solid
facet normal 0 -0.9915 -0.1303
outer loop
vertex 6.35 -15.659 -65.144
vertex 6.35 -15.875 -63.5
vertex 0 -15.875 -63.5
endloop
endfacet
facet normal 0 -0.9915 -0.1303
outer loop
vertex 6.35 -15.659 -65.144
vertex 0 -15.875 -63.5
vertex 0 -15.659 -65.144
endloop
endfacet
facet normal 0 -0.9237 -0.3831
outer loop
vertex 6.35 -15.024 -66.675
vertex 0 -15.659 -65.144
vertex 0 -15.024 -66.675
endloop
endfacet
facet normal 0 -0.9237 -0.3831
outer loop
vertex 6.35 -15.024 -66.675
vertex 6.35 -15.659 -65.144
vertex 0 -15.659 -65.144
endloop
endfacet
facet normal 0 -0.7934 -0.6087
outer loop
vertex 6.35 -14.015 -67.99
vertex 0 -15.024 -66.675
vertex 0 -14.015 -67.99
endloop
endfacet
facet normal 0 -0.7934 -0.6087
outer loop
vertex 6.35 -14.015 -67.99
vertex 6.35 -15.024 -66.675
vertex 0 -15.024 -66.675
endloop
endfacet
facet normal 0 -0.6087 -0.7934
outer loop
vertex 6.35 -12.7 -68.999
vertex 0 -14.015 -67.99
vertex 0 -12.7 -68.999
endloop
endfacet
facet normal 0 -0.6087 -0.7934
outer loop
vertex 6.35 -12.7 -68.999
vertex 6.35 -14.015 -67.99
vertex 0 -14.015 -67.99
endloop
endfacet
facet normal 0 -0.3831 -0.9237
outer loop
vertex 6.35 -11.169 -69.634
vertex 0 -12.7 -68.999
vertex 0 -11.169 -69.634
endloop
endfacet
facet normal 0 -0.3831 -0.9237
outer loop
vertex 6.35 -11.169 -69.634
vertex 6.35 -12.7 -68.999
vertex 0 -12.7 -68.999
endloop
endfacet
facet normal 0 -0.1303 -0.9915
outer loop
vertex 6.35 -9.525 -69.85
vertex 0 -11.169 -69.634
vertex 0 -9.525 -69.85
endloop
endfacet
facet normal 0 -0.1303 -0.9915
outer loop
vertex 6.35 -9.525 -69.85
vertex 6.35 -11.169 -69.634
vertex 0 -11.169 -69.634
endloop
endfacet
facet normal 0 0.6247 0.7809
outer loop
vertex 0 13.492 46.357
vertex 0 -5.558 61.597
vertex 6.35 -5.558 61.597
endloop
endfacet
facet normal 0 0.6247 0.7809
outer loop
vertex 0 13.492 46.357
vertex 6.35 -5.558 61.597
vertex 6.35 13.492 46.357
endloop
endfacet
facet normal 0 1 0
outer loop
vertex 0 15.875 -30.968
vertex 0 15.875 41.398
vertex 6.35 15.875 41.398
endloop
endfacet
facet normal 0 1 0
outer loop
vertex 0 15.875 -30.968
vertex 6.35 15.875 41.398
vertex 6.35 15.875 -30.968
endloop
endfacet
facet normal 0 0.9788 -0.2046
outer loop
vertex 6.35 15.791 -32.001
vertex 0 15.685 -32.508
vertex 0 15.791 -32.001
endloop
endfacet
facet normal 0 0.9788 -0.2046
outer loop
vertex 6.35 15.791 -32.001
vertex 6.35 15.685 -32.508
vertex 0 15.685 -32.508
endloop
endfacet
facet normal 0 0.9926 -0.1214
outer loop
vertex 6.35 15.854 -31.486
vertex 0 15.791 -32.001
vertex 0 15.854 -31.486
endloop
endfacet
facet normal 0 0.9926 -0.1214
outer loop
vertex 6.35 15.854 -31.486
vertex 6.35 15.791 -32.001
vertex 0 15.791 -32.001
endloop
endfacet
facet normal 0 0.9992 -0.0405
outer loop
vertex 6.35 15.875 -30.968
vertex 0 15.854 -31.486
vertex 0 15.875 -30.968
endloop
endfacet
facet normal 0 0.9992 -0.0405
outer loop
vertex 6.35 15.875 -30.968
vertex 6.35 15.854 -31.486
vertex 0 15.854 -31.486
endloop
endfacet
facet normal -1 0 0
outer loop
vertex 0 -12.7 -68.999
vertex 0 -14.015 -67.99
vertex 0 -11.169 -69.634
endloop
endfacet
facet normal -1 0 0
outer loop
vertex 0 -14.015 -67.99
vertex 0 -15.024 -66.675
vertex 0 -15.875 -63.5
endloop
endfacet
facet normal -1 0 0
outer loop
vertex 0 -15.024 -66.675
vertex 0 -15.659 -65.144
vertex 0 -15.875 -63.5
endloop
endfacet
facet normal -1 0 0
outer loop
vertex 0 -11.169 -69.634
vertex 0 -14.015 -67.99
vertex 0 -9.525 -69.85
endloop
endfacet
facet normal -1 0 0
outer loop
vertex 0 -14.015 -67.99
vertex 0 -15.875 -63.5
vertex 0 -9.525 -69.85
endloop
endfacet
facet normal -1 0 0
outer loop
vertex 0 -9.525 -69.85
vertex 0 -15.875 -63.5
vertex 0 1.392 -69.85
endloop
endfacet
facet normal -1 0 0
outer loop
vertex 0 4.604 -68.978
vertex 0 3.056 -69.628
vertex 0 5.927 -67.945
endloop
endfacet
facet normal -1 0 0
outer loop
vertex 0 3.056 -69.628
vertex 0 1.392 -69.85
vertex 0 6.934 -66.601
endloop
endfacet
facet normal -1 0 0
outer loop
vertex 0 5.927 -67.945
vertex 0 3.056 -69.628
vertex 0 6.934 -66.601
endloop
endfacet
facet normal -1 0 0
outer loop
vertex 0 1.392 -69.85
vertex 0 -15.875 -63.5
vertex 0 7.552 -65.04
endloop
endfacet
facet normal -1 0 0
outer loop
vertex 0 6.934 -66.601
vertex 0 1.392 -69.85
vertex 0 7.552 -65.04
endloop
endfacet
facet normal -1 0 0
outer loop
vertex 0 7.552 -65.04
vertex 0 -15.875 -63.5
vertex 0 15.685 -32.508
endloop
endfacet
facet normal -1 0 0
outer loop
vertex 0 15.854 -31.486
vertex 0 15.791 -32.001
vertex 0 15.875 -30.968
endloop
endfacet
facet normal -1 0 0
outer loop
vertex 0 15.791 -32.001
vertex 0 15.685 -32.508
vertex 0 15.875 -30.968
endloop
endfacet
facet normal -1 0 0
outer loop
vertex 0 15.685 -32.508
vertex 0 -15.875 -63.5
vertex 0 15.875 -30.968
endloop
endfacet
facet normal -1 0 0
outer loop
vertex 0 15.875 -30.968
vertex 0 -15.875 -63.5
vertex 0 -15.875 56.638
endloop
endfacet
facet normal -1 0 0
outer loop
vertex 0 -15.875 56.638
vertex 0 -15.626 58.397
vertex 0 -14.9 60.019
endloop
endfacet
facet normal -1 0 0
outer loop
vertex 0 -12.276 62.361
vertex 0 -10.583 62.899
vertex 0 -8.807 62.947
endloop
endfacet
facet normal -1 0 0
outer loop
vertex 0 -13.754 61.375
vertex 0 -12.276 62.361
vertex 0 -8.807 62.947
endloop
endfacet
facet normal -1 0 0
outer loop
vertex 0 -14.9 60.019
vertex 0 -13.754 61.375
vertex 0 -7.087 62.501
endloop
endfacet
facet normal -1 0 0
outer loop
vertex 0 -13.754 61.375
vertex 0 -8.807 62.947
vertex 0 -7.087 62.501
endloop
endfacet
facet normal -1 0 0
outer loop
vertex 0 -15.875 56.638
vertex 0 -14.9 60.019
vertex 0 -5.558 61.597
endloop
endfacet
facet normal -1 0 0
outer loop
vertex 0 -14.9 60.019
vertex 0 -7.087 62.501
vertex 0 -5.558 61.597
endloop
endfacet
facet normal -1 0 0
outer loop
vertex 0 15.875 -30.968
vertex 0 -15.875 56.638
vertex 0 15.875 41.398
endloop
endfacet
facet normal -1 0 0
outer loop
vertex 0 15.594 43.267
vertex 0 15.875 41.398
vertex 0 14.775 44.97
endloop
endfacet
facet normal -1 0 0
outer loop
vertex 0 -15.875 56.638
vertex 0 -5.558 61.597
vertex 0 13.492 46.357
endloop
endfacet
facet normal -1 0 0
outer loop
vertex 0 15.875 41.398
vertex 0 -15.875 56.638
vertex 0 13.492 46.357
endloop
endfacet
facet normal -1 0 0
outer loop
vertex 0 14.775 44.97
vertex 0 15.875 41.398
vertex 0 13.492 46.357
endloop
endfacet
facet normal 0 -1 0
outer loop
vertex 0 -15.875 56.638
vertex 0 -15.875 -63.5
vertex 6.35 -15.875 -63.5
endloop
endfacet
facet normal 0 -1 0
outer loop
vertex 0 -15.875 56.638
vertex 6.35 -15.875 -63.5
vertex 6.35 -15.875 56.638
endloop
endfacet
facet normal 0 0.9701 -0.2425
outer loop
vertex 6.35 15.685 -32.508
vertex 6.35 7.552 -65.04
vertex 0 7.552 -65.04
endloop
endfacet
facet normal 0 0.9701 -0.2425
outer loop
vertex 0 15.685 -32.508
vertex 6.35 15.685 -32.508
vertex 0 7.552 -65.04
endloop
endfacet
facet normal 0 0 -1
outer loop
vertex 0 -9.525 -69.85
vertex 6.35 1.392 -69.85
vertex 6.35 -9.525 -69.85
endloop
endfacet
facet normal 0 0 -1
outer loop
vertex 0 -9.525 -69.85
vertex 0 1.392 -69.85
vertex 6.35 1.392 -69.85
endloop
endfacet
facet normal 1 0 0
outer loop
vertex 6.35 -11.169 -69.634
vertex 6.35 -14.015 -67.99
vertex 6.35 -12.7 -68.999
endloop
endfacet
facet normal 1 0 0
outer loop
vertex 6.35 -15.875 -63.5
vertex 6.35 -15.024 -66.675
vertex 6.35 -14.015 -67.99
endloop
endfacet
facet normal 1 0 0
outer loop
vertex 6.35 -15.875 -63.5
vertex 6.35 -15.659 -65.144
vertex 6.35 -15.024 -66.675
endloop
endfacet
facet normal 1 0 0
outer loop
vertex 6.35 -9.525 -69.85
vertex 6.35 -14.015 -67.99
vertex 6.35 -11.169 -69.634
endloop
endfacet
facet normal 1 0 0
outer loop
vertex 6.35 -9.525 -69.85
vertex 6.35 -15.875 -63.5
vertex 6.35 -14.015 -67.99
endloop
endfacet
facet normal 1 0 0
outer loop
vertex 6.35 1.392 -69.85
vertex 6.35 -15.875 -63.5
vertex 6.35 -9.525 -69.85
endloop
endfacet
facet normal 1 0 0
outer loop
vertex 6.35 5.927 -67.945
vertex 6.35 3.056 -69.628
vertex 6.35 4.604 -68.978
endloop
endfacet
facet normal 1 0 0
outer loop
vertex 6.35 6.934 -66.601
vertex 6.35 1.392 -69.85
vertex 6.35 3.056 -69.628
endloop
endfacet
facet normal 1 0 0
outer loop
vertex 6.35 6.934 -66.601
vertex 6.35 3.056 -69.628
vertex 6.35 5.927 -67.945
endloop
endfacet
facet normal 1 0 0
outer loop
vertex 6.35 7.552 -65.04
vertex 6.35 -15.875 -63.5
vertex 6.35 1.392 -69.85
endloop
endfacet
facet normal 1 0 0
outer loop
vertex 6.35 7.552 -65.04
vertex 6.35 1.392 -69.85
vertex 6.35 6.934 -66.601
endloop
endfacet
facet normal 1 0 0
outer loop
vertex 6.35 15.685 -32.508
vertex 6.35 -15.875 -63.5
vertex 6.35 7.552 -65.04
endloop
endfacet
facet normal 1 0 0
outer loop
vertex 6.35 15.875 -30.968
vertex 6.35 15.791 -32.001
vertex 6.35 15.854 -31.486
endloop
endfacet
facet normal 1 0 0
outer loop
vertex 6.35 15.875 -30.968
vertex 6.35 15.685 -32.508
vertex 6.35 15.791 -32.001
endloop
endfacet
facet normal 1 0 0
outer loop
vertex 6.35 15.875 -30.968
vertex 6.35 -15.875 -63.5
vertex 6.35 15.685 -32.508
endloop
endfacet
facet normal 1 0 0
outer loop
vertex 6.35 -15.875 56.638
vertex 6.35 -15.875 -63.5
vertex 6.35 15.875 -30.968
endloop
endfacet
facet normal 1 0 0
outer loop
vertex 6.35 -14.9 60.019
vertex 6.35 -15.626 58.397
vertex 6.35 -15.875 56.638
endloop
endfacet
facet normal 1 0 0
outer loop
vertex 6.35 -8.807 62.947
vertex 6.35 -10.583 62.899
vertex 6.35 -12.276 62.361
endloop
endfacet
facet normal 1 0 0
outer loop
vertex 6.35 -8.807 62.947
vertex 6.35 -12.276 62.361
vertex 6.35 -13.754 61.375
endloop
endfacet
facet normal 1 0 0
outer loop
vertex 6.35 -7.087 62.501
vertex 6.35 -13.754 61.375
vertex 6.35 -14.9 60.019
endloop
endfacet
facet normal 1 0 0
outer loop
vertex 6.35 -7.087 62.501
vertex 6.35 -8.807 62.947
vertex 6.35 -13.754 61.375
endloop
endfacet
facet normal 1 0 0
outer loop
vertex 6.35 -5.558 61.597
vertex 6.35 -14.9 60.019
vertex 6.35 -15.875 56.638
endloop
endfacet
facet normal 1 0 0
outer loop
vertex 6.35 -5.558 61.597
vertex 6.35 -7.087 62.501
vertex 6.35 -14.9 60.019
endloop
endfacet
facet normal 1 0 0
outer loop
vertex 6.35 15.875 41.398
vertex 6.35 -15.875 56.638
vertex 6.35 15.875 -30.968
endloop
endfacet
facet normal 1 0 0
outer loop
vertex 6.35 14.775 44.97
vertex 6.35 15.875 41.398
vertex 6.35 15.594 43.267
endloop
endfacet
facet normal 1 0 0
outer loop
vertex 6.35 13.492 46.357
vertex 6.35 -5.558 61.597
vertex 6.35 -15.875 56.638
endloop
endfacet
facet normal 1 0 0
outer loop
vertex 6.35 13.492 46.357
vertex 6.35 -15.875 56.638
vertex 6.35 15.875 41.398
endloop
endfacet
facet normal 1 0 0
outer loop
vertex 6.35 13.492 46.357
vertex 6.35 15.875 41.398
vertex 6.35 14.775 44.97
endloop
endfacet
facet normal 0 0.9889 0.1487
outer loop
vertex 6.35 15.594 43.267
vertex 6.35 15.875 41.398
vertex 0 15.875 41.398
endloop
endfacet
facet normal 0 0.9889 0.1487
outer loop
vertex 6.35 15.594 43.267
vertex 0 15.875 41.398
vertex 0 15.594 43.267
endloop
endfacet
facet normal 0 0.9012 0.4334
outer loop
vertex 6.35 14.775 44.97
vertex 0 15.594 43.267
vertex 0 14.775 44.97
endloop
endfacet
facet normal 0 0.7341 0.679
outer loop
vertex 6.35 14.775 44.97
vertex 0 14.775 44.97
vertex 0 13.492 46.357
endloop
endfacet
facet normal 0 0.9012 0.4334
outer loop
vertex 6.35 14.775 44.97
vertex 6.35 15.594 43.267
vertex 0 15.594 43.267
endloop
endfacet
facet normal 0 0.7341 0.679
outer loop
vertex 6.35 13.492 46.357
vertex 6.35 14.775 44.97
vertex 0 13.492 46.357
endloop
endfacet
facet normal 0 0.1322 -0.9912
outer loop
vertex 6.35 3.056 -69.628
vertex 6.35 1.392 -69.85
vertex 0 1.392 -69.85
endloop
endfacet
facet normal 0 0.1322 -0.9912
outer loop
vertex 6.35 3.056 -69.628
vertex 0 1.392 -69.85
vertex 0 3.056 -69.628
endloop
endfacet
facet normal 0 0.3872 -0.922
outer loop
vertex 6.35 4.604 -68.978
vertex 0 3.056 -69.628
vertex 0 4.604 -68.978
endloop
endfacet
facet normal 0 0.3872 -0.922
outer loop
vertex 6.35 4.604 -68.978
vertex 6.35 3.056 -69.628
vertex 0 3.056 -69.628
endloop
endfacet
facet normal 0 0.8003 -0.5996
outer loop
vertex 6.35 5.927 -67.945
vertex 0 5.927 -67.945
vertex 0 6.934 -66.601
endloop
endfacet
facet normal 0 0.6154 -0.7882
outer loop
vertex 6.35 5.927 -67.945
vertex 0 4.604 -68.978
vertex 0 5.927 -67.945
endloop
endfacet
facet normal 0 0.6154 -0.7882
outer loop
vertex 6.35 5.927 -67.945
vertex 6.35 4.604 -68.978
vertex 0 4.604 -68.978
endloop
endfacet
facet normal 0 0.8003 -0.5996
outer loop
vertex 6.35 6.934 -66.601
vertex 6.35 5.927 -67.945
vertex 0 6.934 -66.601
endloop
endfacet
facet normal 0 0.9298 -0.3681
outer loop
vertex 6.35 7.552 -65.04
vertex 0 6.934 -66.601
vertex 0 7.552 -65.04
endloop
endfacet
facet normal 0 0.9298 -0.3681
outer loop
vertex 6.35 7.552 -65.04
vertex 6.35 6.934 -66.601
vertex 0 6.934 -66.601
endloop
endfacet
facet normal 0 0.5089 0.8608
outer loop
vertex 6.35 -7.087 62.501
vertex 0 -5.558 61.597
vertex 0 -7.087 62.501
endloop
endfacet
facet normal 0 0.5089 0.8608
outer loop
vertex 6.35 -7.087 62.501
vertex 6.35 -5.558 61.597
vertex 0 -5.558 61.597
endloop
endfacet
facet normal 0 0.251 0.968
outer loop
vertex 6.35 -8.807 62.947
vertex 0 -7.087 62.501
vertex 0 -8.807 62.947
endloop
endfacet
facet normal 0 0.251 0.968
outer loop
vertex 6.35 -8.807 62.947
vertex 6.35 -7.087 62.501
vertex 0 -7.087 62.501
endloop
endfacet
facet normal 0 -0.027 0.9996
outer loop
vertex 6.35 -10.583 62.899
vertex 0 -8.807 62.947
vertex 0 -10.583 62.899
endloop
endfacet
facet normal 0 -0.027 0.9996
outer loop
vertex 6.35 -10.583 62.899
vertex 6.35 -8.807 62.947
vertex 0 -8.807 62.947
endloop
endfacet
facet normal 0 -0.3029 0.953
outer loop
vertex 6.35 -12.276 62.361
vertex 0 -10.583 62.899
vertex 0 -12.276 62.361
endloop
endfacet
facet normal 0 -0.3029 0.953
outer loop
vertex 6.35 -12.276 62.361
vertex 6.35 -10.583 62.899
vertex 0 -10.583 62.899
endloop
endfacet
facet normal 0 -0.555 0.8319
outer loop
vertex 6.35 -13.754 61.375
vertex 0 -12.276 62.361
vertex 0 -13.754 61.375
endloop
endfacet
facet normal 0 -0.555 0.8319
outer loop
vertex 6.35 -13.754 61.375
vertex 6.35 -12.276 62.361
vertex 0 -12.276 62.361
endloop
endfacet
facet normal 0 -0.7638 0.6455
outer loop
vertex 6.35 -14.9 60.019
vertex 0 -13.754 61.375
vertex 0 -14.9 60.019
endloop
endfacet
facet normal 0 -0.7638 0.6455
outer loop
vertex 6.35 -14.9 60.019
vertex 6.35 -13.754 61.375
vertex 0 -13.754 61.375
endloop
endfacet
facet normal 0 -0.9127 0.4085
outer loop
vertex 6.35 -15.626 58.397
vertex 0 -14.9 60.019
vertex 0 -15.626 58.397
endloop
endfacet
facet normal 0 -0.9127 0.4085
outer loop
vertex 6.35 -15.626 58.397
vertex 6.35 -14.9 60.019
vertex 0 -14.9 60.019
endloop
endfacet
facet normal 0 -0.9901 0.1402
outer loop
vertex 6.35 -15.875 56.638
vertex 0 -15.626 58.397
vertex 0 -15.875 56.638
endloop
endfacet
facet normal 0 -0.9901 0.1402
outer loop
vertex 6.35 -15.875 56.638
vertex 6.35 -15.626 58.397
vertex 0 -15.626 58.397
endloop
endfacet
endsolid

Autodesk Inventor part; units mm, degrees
ref_plane "YZ Plane" through (0, 0, 0) normal (1, 0, 0) x (0, 1, 0)
ref_plane "XZ Plane" through (0, 0, 0) normal (0, 1, 0) x (-1, 0, 0)
ref_plane "XY Plane" through (0, 0, 0) normal (0, 0, 1) x (1, 0, 0)
sketch "Sketch1" plane through (0, 0, 0) normal (1, 0, 0) x (0, 1, 0)
  line L0 (-15.875, 69.85) -> (15.875, 69.85)
  line L1 (15.875, 69.85) -> (15.875, -69.85)
  line L2 (15.875, -69.85) -> (-15.875, -69.85)
  line L3 (-15.875, -69.85) -> (-15.875, 69.85)
  line L4 (-15.875, 69.85) -> (15.875, -69.85) construction
  line L5 (15.875, 69.85) -> (-15.875, -69.85) construction
  line L6 (-15.875, 69.85) -> (15.875, 44.45)
  point P0 (0, 0)
  dimension "d0" = 31.75
  dimension "d1" = 139.7
  dimension "d2" = 25.4
extrude "Extrusion1" add sketch "Sketch1" along normal blind 6.35 contours L6 L1 L2 L3
chamfer "Chamfer1" distance 9.525 distance2 38.1 1 edges at (3.175, 15.875, -69.85) measured on face at (4.2333, -5.2917, -69.85)
fillet "Fillet1" radius 6.35 4 edges at (3.175, -15.875, 69.85) (3.175, 15.875, -31.75) (3.175, 6.35, -69.85) (3.175, -15.875, -69.85)
fillet "Fillet2" radius 6.35 1 edges at (3.175, 15.875, 44.45)
properties part number "Wheel Guards" material "UHMW, White"
